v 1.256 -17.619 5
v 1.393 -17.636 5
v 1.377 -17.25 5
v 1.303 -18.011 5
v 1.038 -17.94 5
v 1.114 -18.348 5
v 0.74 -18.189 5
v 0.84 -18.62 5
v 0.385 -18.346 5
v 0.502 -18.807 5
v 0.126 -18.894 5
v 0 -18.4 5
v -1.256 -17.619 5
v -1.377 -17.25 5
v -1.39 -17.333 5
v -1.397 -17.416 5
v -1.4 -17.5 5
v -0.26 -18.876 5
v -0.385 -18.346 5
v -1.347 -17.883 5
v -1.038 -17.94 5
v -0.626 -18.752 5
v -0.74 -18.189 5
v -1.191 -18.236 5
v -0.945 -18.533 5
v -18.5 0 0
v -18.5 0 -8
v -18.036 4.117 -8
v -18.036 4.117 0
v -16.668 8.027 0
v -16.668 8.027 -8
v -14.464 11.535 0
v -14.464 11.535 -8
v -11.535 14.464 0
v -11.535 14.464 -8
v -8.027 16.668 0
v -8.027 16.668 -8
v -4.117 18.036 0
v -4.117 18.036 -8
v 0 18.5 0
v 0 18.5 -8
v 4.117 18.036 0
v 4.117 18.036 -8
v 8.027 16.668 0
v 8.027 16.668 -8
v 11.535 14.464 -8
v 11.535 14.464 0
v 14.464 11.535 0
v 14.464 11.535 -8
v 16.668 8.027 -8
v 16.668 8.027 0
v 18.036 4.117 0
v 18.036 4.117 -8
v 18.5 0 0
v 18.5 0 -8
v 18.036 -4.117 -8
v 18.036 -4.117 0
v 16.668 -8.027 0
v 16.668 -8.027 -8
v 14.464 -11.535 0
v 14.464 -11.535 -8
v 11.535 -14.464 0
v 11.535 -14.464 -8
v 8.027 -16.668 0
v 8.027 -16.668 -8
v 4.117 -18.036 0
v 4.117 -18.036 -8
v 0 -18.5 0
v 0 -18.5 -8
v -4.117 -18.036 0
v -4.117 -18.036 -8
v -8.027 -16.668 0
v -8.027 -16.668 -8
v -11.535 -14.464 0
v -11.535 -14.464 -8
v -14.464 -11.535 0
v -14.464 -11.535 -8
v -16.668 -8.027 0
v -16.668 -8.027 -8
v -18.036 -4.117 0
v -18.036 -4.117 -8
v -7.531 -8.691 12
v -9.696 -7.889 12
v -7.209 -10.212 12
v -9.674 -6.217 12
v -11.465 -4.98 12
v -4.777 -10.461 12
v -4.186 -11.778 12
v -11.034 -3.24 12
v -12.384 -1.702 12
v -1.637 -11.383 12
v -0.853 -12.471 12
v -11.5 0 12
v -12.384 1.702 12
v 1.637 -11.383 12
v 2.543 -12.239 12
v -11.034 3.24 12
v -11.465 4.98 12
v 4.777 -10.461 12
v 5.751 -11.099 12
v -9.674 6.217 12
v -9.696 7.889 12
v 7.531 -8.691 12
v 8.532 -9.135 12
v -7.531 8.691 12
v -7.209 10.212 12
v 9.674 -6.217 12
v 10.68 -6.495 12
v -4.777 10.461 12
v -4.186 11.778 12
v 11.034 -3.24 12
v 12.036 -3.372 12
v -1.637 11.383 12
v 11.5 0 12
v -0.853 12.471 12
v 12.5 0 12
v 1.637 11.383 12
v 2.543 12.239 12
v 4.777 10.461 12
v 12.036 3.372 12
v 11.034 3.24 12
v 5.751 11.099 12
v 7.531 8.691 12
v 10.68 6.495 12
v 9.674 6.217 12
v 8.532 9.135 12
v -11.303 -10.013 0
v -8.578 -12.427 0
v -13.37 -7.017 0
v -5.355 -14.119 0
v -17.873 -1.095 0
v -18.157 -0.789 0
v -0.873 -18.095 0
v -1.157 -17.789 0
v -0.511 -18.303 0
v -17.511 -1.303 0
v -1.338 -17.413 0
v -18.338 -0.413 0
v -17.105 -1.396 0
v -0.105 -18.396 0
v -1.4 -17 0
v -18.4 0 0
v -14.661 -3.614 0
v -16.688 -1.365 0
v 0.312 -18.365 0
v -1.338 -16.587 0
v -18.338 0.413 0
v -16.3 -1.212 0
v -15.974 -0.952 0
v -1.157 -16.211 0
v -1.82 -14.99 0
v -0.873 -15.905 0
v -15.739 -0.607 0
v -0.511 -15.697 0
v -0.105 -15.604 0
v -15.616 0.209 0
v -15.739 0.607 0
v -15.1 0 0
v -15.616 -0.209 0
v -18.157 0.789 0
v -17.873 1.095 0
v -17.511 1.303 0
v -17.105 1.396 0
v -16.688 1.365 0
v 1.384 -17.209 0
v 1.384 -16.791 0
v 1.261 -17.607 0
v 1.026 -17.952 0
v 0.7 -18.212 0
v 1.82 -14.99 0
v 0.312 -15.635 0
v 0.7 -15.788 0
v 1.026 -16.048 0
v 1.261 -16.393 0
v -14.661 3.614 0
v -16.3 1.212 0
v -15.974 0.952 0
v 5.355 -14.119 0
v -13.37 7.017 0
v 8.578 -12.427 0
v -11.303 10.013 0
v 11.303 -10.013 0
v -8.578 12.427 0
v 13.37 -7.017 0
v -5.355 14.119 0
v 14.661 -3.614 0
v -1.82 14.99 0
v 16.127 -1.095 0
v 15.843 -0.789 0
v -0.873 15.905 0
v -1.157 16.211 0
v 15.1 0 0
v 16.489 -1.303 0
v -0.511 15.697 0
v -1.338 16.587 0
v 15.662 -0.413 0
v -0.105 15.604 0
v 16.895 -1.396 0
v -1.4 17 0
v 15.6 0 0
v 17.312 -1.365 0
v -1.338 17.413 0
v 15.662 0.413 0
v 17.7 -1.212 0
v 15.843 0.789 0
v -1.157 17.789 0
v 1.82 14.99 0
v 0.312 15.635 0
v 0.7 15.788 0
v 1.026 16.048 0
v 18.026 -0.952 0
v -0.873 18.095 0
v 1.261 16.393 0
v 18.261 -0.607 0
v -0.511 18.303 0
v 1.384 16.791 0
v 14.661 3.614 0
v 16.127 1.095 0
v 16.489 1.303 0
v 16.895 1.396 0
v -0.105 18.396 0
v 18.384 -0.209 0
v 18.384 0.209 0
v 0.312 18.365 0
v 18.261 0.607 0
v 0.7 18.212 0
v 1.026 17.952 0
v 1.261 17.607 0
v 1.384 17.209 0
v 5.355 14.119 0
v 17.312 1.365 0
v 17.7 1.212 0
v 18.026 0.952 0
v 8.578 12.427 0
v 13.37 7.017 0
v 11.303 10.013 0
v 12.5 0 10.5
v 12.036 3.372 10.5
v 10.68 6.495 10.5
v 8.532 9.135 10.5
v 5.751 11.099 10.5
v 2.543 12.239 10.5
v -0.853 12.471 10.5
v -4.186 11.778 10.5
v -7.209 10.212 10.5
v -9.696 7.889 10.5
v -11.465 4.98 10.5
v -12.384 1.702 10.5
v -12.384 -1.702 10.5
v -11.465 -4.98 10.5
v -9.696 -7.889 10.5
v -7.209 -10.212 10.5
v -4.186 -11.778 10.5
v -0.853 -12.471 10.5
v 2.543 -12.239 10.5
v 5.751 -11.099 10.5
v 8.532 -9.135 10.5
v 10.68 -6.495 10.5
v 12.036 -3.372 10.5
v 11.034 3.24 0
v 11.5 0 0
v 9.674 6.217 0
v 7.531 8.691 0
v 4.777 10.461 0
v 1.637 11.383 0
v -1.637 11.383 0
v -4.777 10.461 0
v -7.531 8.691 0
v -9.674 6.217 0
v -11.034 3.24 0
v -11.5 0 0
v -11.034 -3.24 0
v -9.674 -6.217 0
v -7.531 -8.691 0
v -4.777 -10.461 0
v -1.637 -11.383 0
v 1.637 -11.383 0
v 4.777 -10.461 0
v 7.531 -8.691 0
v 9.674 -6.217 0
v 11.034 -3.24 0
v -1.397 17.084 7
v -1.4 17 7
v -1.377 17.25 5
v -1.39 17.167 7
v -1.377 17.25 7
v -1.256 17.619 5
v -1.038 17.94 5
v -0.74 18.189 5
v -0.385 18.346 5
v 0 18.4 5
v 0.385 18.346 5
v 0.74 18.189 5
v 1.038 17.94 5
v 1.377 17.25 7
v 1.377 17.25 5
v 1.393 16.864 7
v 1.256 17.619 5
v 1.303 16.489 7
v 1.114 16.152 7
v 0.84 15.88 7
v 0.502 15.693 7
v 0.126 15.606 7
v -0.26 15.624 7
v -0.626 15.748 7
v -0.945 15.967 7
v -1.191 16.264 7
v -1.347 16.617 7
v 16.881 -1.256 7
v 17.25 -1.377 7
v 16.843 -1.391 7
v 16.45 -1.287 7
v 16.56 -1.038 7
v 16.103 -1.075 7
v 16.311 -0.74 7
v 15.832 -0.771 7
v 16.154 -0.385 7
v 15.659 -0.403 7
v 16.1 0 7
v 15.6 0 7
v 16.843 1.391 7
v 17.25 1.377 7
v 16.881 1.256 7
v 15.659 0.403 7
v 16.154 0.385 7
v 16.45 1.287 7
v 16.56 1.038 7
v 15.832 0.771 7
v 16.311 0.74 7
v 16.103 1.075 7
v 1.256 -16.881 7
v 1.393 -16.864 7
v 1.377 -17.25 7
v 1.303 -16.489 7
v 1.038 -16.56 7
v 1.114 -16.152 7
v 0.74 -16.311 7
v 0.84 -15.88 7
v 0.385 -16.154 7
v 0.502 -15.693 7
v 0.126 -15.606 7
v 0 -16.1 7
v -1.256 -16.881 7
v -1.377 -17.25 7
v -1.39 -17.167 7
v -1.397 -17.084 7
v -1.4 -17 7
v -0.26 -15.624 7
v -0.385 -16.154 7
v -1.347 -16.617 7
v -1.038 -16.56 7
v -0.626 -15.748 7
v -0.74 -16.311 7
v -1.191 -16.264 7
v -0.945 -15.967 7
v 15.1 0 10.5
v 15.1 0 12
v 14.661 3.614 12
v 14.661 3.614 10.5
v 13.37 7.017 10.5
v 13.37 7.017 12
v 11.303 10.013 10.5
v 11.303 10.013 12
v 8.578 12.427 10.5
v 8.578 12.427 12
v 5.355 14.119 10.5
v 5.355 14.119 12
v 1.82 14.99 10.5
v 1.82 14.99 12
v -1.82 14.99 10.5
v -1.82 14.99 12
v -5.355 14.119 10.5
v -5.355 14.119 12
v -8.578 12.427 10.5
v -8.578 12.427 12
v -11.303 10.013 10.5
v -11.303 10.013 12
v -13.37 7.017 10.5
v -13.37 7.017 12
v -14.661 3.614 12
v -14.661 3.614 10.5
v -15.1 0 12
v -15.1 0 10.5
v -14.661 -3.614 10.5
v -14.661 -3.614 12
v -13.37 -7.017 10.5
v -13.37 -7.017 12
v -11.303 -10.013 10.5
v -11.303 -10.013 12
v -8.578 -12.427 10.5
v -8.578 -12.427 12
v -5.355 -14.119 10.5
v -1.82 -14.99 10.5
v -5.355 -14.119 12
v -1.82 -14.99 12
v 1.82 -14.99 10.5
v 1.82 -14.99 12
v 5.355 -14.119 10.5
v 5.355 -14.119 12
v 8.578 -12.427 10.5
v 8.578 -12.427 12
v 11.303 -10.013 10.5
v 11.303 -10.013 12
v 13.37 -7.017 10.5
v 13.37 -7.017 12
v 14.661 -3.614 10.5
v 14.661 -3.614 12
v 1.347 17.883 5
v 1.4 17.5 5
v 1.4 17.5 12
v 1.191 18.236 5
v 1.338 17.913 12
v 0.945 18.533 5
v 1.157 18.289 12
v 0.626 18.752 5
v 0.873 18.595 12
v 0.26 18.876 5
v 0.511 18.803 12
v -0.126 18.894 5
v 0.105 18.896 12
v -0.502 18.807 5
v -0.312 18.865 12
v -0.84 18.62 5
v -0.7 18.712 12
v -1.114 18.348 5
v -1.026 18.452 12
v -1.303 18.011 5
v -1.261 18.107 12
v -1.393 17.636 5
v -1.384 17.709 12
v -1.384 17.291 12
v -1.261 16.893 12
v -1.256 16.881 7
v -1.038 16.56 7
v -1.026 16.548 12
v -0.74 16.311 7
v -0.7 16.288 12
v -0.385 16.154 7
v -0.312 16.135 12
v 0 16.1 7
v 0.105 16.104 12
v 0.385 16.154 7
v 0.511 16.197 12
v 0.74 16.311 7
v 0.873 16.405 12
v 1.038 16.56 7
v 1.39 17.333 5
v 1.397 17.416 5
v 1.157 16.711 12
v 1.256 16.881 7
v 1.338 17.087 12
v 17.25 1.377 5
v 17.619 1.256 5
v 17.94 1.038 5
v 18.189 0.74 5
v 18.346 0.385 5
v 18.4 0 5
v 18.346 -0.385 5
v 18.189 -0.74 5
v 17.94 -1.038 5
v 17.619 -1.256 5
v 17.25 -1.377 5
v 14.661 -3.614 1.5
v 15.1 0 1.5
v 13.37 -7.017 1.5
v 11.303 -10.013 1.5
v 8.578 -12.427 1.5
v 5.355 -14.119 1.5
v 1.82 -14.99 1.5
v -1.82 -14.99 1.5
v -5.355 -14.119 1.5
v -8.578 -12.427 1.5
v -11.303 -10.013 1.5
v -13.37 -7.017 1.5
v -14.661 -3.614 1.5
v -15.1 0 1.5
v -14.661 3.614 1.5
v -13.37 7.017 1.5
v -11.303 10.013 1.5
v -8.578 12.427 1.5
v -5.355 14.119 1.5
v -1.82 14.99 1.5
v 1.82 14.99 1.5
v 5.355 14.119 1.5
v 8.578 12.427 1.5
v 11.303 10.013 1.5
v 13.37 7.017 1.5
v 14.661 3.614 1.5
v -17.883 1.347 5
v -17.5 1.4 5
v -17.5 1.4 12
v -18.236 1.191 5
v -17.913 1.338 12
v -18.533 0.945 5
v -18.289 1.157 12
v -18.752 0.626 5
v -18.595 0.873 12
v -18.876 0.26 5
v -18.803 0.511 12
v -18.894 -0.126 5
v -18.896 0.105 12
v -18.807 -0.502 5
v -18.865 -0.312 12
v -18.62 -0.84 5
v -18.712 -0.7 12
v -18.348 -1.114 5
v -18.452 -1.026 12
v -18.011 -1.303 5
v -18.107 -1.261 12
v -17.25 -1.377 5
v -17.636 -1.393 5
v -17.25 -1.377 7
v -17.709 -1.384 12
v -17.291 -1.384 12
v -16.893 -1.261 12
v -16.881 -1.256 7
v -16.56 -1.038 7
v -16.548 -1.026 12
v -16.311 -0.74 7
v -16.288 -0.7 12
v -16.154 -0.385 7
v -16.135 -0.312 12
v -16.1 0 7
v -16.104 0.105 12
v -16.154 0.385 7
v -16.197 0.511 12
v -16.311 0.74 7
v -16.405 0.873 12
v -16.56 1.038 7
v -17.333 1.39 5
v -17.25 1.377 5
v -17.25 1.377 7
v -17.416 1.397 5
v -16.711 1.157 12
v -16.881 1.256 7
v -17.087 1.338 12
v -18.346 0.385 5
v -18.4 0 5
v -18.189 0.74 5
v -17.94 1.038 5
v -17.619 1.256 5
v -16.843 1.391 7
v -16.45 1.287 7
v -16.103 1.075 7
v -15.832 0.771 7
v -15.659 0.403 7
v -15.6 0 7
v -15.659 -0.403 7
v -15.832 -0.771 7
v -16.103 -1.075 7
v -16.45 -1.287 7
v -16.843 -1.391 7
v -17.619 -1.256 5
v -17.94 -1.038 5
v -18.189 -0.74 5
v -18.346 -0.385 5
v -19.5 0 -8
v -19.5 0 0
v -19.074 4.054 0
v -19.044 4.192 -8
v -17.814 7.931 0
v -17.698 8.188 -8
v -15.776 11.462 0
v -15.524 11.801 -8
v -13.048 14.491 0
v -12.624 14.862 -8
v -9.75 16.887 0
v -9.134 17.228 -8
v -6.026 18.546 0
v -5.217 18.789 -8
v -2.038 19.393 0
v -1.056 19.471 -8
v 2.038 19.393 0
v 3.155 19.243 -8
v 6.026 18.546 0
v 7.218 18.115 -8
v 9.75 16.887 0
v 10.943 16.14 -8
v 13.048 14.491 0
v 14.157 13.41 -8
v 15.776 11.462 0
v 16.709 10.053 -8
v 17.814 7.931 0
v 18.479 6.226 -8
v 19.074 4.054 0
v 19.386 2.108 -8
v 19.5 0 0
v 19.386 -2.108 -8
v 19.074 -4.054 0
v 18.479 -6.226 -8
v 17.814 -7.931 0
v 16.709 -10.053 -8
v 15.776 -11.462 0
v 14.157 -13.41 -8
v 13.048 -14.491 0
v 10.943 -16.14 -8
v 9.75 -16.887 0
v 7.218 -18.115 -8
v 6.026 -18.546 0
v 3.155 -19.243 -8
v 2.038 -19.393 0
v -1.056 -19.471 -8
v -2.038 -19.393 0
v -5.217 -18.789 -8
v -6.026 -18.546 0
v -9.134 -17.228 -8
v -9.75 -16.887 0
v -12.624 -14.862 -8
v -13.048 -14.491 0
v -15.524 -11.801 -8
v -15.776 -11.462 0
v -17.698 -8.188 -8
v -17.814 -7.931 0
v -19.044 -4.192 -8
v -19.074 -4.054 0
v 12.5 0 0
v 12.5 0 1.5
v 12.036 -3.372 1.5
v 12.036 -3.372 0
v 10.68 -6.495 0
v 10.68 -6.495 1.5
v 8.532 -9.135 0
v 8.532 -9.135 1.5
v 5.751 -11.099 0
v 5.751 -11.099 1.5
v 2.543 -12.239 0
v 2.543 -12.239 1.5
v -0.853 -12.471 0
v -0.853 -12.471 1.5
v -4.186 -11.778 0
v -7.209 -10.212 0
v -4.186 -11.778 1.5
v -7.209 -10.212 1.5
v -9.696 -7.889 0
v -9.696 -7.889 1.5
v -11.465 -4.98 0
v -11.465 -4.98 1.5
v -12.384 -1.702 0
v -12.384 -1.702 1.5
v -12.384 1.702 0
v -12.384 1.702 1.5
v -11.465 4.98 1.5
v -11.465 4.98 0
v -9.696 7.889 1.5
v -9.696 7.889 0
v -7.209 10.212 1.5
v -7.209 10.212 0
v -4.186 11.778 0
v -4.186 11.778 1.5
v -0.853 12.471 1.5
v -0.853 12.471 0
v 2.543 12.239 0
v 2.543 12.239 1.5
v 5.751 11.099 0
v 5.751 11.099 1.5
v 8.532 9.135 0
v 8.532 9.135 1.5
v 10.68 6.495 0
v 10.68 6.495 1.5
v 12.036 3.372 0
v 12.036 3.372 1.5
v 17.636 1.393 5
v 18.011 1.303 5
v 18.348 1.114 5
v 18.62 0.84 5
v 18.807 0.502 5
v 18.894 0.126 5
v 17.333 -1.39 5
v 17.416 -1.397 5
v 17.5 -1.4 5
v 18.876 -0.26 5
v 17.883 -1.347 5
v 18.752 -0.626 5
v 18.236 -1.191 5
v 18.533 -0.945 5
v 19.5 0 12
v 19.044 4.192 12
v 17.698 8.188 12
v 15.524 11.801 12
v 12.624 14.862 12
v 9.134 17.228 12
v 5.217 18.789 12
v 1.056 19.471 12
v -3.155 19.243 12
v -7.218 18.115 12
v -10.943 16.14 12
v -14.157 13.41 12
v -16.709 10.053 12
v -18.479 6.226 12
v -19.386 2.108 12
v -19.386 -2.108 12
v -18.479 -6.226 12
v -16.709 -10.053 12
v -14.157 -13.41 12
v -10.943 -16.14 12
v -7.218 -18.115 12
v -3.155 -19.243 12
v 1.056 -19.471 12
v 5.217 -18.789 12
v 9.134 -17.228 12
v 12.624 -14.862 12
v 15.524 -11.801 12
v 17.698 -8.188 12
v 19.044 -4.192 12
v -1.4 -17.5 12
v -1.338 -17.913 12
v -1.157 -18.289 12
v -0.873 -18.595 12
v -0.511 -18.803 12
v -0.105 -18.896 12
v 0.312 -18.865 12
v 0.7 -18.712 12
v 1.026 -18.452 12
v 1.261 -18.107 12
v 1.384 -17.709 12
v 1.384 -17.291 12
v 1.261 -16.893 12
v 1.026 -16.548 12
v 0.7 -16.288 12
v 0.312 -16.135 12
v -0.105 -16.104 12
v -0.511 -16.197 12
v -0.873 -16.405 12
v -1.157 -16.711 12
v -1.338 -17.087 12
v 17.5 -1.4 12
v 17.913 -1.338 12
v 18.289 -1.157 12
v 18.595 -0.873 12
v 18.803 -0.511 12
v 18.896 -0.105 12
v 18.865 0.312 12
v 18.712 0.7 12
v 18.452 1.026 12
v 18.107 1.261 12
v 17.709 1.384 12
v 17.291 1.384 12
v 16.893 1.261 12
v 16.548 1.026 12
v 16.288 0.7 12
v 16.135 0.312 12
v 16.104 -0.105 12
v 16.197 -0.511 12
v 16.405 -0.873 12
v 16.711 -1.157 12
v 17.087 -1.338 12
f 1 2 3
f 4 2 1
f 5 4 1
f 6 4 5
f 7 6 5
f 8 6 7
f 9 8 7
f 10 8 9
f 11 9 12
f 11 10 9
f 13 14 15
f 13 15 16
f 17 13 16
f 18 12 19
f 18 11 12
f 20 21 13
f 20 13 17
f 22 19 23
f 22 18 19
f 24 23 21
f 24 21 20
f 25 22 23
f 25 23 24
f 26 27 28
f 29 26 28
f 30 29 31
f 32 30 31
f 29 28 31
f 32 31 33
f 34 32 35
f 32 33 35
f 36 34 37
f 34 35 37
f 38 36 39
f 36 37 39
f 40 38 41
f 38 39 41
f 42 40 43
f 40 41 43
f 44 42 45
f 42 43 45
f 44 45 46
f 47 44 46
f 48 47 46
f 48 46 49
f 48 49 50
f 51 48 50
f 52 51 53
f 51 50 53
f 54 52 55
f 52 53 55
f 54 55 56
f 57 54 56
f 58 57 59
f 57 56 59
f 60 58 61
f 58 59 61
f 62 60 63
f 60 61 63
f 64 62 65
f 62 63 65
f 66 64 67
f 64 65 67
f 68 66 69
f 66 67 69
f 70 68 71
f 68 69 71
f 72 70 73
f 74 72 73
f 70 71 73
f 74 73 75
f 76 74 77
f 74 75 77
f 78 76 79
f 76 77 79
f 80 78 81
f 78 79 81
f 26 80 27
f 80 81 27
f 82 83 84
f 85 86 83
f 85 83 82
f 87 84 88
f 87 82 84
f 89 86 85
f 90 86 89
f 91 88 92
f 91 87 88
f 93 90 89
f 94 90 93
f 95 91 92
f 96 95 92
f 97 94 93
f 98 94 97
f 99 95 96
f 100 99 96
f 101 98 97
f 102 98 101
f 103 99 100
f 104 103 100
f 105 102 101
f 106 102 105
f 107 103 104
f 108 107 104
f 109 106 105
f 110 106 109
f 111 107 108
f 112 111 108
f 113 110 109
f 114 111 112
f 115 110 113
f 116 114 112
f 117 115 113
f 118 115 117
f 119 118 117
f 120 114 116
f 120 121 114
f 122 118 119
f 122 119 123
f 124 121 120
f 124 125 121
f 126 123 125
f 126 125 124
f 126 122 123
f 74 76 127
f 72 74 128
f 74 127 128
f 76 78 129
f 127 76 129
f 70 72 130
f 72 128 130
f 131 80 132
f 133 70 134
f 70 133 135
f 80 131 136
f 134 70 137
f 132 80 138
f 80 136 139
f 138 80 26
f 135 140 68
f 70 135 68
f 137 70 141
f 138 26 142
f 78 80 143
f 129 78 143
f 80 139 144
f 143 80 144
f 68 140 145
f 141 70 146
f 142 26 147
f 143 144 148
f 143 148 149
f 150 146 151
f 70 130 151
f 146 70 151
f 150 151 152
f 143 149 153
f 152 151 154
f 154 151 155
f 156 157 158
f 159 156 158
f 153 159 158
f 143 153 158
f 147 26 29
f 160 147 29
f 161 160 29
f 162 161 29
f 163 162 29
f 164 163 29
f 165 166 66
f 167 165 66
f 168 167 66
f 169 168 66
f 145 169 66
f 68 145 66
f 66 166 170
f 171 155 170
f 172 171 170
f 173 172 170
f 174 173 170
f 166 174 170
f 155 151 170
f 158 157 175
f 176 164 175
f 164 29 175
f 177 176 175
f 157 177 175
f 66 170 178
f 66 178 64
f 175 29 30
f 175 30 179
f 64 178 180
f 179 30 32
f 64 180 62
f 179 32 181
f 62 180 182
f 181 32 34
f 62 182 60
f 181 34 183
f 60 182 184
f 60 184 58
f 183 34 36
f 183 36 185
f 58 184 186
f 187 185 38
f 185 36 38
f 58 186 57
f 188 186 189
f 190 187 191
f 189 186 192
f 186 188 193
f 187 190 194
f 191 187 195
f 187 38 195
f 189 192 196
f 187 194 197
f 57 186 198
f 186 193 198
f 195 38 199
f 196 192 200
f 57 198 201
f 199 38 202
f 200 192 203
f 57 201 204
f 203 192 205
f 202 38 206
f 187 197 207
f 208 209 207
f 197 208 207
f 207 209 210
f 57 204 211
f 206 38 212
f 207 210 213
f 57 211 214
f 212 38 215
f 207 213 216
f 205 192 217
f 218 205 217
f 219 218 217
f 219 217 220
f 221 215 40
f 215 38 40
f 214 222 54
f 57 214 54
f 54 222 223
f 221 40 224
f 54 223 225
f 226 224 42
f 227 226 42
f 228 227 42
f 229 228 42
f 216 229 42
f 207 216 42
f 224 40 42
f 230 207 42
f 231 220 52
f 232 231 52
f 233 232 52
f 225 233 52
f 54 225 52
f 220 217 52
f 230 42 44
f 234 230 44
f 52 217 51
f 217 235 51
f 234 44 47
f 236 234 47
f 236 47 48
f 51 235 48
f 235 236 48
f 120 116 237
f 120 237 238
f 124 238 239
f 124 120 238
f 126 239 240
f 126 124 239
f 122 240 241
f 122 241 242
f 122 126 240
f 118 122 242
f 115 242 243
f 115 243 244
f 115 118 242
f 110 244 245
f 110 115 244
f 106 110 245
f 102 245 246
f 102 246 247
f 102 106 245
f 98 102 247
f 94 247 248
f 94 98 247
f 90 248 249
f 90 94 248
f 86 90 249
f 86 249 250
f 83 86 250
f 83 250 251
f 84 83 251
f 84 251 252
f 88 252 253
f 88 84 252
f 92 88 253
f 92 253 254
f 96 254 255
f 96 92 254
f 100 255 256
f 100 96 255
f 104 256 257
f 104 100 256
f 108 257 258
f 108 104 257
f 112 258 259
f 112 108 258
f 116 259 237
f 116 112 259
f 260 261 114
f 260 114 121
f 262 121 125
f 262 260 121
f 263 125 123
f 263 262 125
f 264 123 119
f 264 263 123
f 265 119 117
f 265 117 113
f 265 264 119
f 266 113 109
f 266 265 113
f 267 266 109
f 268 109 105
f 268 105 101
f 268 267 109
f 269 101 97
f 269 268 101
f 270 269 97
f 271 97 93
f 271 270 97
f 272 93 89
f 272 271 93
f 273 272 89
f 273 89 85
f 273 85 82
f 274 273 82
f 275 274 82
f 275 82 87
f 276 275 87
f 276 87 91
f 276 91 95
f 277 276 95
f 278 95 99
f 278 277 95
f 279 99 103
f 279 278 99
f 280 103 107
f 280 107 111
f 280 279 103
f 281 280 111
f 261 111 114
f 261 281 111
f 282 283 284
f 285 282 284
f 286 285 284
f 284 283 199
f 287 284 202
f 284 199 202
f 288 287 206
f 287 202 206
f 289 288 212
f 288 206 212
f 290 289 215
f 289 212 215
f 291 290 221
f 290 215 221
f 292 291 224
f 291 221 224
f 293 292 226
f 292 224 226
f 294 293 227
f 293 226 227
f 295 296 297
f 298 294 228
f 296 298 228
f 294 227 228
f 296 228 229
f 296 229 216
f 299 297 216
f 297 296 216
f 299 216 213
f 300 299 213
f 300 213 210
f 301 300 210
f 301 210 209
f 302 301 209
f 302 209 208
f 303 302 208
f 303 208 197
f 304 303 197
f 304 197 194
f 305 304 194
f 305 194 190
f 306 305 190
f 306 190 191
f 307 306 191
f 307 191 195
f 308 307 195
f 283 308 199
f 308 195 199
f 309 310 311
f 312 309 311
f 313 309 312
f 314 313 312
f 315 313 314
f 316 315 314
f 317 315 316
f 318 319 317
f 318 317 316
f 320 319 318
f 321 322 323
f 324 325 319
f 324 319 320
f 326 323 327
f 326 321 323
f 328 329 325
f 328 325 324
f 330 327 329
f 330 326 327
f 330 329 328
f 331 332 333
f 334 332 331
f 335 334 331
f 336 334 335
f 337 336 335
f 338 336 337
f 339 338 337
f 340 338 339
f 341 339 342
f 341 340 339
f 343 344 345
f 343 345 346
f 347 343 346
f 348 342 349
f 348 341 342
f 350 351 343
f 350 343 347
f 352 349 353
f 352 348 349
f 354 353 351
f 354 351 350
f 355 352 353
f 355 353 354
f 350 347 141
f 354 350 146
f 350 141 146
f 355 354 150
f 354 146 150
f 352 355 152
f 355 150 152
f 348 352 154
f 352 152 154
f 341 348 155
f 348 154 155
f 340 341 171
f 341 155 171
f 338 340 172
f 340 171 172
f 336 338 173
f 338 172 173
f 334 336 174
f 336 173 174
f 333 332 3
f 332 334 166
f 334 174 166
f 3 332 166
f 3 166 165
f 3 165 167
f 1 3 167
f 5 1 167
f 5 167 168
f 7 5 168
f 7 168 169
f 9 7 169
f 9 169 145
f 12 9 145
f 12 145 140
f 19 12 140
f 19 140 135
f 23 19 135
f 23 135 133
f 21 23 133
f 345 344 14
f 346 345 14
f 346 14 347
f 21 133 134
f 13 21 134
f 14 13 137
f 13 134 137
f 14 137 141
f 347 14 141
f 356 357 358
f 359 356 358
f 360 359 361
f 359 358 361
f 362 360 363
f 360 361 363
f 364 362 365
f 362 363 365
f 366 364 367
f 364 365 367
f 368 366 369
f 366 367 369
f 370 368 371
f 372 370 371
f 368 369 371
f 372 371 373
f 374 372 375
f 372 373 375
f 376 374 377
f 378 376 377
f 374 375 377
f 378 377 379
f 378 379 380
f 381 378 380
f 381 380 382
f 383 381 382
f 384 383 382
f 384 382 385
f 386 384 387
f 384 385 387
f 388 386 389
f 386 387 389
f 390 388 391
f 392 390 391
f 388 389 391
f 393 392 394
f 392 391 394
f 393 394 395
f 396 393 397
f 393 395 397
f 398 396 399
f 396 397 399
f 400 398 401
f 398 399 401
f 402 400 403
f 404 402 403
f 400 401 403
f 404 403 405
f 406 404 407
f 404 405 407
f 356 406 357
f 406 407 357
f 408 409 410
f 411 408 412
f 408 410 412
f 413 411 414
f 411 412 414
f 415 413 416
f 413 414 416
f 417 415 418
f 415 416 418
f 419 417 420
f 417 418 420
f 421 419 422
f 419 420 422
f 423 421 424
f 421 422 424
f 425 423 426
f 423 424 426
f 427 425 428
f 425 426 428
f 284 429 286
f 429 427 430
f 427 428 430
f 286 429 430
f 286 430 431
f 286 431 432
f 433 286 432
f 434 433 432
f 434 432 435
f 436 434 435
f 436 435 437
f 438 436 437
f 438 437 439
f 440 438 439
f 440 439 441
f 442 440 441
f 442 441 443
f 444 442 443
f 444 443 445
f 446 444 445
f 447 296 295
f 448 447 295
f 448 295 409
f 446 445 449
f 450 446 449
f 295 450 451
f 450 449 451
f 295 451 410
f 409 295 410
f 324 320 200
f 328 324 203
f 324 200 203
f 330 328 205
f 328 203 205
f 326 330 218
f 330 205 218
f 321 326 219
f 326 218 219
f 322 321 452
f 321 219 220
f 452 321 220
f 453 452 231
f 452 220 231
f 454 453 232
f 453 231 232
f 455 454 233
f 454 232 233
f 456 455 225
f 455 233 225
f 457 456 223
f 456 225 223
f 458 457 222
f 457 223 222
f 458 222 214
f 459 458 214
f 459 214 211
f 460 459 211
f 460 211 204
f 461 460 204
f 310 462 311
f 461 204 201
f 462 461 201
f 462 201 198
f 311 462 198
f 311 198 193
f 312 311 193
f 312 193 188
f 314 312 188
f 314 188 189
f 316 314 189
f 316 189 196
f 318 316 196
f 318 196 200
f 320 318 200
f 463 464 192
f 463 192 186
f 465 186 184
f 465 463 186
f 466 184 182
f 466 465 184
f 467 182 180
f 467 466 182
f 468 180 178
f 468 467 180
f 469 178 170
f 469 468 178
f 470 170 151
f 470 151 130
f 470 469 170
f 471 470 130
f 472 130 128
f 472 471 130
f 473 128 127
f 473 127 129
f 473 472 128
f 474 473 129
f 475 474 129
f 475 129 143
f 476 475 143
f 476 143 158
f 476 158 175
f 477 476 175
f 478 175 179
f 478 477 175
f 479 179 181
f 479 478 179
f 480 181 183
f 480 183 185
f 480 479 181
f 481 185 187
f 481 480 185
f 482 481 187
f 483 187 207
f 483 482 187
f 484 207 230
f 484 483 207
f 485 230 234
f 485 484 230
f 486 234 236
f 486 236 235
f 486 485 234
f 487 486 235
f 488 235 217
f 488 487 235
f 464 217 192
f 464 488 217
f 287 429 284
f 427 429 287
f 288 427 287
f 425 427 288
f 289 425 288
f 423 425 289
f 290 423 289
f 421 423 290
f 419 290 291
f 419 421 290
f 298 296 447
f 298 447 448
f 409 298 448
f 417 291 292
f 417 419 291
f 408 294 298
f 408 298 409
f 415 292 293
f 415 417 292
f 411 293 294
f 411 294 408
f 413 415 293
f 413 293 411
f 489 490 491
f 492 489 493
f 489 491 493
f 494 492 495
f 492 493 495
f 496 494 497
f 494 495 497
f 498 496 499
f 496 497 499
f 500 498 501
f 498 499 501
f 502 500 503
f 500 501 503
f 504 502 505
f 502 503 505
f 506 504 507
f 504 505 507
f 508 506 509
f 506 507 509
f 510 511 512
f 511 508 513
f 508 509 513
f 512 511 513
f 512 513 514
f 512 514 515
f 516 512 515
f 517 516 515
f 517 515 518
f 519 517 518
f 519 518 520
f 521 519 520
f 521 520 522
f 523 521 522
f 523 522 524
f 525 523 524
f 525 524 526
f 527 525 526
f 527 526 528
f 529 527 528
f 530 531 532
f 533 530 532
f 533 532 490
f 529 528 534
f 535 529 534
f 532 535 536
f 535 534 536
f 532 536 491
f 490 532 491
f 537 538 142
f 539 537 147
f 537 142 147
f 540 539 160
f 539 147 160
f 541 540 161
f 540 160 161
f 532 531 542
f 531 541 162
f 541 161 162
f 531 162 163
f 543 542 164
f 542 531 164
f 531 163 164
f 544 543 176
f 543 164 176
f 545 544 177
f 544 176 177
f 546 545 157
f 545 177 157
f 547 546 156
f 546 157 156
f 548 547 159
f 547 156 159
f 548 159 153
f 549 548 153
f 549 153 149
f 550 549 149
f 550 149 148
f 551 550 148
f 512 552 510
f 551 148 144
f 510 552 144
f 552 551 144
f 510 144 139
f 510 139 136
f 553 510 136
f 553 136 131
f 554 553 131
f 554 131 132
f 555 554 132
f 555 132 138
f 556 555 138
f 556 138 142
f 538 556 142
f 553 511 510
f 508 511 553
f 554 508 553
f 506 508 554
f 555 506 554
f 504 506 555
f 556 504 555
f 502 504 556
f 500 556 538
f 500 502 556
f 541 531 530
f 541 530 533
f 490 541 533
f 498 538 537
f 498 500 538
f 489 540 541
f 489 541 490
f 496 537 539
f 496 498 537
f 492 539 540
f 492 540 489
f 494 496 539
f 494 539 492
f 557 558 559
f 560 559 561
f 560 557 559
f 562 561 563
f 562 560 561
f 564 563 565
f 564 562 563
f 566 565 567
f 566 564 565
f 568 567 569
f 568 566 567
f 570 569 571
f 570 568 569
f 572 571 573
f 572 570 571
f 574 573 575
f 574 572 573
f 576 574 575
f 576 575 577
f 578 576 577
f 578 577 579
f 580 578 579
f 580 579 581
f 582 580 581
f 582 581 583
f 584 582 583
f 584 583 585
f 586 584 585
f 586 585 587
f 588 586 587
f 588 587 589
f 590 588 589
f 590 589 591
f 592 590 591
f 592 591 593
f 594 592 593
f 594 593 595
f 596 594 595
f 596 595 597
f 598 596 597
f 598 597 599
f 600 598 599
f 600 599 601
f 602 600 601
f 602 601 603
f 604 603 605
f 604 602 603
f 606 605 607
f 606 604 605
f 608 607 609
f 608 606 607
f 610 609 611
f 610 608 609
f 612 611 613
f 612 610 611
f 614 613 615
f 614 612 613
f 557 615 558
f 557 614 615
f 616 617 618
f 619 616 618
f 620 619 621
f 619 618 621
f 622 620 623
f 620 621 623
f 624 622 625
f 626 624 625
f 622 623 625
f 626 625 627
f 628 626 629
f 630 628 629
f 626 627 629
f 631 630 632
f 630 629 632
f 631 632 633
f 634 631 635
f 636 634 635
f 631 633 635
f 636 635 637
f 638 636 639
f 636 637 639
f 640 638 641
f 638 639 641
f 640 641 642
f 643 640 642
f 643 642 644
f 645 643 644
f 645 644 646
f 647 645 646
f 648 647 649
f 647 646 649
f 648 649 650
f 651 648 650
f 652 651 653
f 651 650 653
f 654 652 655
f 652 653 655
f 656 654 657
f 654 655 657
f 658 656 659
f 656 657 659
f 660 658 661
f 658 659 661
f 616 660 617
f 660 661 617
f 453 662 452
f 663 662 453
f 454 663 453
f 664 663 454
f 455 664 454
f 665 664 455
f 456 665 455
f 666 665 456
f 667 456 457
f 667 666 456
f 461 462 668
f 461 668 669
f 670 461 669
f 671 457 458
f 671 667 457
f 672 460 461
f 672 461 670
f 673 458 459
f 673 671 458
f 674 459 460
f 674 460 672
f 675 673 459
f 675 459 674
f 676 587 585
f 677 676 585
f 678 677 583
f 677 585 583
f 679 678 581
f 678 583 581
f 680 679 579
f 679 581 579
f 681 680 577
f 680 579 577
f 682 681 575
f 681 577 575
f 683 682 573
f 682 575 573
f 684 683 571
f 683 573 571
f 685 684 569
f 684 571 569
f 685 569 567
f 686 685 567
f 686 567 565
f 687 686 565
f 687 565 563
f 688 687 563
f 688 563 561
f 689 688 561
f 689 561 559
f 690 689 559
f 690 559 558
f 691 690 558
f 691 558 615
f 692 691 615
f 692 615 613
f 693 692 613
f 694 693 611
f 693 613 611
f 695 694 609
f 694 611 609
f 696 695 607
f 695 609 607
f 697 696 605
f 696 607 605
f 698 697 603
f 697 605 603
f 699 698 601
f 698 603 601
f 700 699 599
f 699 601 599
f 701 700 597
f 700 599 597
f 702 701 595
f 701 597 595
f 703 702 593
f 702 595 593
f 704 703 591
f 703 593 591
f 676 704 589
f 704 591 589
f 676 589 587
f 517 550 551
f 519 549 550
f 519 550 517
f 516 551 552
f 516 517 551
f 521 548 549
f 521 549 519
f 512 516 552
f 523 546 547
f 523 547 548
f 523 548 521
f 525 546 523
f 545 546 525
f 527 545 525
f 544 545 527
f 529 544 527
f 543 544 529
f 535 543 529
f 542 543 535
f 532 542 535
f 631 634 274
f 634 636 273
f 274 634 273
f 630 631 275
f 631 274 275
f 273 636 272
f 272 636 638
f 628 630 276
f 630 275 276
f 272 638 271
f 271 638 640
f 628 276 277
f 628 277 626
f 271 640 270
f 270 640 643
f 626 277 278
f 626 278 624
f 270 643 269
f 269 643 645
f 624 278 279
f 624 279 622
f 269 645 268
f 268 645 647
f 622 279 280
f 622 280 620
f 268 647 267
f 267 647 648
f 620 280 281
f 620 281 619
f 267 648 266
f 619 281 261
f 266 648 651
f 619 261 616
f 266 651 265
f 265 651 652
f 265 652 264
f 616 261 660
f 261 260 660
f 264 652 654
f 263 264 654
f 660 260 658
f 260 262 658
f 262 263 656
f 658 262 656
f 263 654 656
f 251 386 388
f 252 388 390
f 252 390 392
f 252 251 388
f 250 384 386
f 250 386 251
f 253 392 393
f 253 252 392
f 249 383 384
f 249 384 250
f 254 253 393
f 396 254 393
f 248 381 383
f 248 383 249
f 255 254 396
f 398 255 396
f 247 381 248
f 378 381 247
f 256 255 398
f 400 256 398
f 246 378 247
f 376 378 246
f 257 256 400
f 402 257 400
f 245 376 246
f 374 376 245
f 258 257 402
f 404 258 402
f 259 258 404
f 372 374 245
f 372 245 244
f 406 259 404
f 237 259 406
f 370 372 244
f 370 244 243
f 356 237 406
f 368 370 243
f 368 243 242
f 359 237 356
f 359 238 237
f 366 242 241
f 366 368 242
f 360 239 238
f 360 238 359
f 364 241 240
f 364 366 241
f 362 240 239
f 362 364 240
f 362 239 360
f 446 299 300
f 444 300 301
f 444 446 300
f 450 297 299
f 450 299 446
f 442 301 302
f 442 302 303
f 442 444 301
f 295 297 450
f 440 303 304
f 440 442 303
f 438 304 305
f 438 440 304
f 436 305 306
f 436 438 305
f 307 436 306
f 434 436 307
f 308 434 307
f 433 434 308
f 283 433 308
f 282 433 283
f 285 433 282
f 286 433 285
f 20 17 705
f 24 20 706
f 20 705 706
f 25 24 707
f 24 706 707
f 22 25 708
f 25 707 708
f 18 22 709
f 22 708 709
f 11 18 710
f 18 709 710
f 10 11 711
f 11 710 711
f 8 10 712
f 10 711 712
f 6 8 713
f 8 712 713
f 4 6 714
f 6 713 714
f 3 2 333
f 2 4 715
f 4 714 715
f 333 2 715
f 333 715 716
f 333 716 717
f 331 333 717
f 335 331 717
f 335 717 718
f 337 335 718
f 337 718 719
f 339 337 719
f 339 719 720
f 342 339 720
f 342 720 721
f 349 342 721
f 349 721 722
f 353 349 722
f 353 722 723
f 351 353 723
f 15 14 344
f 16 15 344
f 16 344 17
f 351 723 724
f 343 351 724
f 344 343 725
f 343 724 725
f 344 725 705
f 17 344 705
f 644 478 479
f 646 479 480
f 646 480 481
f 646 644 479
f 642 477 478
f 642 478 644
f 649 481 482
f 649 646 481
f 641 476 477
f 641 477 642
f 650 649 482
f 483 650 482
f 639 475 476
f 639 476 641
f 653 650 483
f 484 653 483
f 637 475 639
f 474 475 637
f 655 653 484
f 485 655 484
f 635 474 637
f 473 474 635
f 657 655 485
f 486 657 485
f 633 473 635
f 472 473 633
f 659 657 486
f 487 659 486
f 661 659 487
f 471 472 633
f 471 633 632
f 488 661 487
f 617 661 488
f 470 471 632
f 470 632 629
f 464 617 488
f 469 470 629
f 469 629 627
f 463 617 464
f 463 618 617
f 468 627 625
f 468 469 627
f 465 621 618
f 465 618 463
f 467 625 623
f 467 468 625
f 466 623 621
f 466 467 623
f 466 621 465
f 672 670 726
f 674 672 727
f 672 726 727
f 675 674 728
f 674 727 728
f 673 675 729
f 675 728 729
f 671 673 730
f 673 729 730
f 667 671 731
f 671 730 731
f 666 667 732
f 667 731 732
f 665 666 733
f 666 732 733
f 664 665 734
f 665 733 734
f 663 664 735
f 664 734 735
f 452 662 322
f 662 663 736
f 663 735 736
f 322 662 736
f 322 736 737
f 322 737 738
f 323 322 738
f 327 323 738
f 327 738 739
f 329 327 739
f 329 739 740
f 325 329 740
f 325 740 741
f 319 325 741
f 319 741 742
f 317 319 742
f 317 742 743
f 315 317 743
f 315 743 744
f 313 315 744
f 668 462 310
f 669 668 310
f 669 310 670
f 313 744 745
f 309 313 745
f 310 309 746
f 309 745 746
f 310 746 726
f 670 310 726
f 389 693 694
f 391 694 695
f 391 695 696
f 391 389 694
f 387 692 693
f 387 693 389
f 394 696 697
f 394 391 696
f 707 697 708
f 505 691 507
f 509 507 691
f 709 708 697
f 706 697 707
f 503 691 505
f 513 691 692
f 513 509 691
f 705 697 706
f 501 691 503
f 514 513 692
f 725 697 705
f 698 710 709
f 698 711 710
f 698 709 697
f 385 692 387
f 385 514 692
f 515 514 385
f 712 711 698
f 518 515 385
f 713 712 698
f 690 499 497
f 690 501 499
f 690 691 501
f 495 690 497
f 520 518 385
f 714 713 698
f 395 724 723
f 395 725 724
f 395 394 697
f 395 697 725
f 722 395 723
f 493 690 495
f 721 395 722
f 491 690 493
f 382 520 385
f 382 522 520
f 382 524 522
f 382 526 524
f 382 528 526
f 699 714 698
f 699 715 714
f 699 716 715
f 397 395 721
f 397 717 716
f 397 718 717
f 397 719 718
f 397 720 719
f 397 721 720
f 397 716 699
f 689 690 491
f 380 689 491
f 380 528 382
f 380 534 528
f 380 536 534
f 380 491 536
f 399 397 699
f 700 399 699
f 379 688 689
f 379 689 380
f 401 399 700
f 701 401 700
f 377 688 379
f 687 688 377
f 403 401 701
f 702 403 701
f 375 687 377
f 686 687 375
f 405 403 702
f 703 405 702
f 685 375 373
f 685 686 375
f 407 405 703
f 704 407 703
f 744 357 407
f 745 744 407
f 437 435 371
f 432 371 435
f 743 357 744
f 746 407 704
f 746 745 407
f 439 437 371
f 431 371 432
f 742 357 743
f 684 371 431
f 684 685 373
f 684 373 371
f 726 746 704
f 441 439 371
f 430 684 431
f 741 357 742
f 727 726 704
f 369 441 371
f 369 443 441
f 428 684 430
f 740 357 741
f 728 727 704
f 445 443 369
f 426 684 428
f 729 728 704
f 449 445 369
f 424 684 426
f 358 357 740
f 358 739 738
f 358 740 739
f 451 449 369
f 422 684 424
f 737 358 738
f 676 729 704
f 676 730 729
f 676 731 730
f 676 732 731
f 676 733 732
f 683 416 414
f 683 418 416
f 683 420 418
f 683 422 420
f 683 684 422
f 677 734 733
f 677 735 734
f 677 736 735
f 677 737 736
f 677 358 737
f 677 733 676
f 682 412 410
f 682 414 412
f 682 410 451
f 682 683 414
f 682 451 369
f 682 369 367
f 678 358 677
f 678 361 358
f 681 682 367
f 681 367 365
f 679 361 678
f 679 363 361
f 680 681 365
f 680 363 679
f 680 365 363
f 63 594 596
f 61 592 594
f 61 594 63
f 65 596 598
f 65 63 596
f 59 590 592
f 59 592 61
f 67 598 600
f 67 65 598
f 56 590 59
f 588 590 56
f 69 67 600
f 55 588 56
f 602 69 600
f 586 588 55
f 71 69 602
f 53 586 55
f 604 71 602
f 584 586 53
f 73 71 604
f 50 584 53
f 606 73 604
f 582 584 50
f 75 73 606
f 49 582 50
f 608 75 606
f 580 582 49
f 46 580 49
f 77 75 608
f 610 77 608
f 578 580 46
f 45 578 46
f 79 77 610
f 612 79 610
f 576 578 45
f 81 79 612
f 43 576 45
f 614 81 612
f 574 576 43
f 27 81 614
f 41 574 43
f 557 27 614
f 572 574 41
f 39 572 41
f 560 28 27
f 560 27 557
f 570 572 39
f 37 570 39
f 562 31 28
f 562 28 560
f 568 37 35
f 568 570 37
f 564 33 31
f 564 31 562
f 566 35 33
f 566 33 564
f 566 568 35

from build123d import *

# Parameters (mm, degrees)
SKETCH1_R           = 19.5
SKETCH1_R_2         = 11.5
EXTRUDE_THIN1_DEPTH = 12
SKETCH2_R           = 1.4
CUT_EXTRUDE1_DEPTH  = 7
CIRPATTERN1_COUNT   = 4
SKETCH5_R           = 15.1
SKETCH5_R_2         = 12.5
CUT_EXTRUDE3_DEPTH  = 1.5
SKETCH6_R           = 1.4
CUT_EXTRUDE4_DEPTH  = 7
CUT_EXTRUDE5_START  = -1.5
SKETCH7_R           = 15.1
SKETCH7_R_2         = 12.5
CUT_EXTRUDE5_DEPTH  = 1.5
EXTRUDE_THIN3_START = 8
SKETCH9_R           = 19.5
SKETCH9_R_2         = 18.5
EXTRUDE_THIN3_DEPTH = 8


with BuildPart() as part:
    # Sketch1 → Extrude-Thin1 (new body)
    with BuildSketch(Plane.XY):
        Circle(SKETCH1_R)
        Circle(SKETCH1_R_2, mode=Mode.SUBTRACT)
    extrude(amount=EXTRUDE_THIN1_DEPTH)

    # Sketch2 → Cut-Extrude1 (cut)
    with BuildSketch(Plane.XY.offset(12)):
        with Locations((0, 17.5)):
            Circle(SKETCH2_R)
    cut_extrude1 = extrude(amount=-CUT_EXTRUDE1_DEPTH, mode=Mode.SUBTRACT)

    # CirPattern1: Cut-Extrude1 ×4 about axis
    cirpattern1_axis = Axis((0, 0, 0), (0, 0, 1))
    for i in range(1, CIRPATTERN1_COUNT):
        add(cut_extrude1.rotate(cirpattern1_axis, i * 360 / CIRPATTERN1_COUNT), mode=Mode.SUBTRACT)

    # Sketch5 → Cut-Extrude3 (cut)
    with BuildSketch(Plane.XY.offset(12)):
        Circle(SKETCH5_R)
        Circle(SKETCH5_R_2, mode=Mode.SUBTRACT)
    extrude(amount=-CUT_EXTRUDE3_DEPTH, mode=Mode.SUBTRACT)

    # Sketch6 → Cut-Extrude4 (cut)
    with BuildSketch(Plane(origin=(0, 0, 0), x_dir=(-1, 0, 0), z_dir=(0, 0, -1))):
        with Locations((0, -17)):
            Circle(SKETCH6_R)
        with Locations((-17, 0)):
            Circle(SKETCH6_R)
        with Locations((0, 17)):
            Circle(SKETCH6_R)
        with Locations((17, 0)):
            Circle(SKETCH6_R)
    extrude(amount=-CUT_EXTRUDE4_DEPTH, mode=Mode.SUBTRACT)

    # Sketch7 → Cut-Extrude5 (cut)
    with BuildSketch(Plane(origin=(0, 0, 0), x_dir=(-1, 0, 0), z_dir=(0, 0, -1)).offset(CUT_EXTRUDE5_START)):
        with Locations(Location((0, 0, 0), (0, 0, 180))):
            Circle(SKETCH7_R)
        with Locations(Location((0, 0, 0), (0, 0, 180))):
            Circle(SKETCH7_R_2, mode=Mode.SUBTRACT)
    extrude(amount=CUT_EXTRUDE5_DEPTH, mode=Mode.SUBTRACT)

    # Sketch9 → Extrude-Thin3 (add)
    with BuildSketch(Plane(origin=(0, 0, 0), x_dir=(-1, 0, 0), z_dir=(0, 0, -1)).offset(EXTRUDE_THIN3_START)):
        Circle(SKETCH9_R)
        Circle(SKETCH9_R_2, mode=Mode.SUBTRACT)
    extrude(amount=-EXTRUDE_THIN3_DEPTH)


solid = part.part
